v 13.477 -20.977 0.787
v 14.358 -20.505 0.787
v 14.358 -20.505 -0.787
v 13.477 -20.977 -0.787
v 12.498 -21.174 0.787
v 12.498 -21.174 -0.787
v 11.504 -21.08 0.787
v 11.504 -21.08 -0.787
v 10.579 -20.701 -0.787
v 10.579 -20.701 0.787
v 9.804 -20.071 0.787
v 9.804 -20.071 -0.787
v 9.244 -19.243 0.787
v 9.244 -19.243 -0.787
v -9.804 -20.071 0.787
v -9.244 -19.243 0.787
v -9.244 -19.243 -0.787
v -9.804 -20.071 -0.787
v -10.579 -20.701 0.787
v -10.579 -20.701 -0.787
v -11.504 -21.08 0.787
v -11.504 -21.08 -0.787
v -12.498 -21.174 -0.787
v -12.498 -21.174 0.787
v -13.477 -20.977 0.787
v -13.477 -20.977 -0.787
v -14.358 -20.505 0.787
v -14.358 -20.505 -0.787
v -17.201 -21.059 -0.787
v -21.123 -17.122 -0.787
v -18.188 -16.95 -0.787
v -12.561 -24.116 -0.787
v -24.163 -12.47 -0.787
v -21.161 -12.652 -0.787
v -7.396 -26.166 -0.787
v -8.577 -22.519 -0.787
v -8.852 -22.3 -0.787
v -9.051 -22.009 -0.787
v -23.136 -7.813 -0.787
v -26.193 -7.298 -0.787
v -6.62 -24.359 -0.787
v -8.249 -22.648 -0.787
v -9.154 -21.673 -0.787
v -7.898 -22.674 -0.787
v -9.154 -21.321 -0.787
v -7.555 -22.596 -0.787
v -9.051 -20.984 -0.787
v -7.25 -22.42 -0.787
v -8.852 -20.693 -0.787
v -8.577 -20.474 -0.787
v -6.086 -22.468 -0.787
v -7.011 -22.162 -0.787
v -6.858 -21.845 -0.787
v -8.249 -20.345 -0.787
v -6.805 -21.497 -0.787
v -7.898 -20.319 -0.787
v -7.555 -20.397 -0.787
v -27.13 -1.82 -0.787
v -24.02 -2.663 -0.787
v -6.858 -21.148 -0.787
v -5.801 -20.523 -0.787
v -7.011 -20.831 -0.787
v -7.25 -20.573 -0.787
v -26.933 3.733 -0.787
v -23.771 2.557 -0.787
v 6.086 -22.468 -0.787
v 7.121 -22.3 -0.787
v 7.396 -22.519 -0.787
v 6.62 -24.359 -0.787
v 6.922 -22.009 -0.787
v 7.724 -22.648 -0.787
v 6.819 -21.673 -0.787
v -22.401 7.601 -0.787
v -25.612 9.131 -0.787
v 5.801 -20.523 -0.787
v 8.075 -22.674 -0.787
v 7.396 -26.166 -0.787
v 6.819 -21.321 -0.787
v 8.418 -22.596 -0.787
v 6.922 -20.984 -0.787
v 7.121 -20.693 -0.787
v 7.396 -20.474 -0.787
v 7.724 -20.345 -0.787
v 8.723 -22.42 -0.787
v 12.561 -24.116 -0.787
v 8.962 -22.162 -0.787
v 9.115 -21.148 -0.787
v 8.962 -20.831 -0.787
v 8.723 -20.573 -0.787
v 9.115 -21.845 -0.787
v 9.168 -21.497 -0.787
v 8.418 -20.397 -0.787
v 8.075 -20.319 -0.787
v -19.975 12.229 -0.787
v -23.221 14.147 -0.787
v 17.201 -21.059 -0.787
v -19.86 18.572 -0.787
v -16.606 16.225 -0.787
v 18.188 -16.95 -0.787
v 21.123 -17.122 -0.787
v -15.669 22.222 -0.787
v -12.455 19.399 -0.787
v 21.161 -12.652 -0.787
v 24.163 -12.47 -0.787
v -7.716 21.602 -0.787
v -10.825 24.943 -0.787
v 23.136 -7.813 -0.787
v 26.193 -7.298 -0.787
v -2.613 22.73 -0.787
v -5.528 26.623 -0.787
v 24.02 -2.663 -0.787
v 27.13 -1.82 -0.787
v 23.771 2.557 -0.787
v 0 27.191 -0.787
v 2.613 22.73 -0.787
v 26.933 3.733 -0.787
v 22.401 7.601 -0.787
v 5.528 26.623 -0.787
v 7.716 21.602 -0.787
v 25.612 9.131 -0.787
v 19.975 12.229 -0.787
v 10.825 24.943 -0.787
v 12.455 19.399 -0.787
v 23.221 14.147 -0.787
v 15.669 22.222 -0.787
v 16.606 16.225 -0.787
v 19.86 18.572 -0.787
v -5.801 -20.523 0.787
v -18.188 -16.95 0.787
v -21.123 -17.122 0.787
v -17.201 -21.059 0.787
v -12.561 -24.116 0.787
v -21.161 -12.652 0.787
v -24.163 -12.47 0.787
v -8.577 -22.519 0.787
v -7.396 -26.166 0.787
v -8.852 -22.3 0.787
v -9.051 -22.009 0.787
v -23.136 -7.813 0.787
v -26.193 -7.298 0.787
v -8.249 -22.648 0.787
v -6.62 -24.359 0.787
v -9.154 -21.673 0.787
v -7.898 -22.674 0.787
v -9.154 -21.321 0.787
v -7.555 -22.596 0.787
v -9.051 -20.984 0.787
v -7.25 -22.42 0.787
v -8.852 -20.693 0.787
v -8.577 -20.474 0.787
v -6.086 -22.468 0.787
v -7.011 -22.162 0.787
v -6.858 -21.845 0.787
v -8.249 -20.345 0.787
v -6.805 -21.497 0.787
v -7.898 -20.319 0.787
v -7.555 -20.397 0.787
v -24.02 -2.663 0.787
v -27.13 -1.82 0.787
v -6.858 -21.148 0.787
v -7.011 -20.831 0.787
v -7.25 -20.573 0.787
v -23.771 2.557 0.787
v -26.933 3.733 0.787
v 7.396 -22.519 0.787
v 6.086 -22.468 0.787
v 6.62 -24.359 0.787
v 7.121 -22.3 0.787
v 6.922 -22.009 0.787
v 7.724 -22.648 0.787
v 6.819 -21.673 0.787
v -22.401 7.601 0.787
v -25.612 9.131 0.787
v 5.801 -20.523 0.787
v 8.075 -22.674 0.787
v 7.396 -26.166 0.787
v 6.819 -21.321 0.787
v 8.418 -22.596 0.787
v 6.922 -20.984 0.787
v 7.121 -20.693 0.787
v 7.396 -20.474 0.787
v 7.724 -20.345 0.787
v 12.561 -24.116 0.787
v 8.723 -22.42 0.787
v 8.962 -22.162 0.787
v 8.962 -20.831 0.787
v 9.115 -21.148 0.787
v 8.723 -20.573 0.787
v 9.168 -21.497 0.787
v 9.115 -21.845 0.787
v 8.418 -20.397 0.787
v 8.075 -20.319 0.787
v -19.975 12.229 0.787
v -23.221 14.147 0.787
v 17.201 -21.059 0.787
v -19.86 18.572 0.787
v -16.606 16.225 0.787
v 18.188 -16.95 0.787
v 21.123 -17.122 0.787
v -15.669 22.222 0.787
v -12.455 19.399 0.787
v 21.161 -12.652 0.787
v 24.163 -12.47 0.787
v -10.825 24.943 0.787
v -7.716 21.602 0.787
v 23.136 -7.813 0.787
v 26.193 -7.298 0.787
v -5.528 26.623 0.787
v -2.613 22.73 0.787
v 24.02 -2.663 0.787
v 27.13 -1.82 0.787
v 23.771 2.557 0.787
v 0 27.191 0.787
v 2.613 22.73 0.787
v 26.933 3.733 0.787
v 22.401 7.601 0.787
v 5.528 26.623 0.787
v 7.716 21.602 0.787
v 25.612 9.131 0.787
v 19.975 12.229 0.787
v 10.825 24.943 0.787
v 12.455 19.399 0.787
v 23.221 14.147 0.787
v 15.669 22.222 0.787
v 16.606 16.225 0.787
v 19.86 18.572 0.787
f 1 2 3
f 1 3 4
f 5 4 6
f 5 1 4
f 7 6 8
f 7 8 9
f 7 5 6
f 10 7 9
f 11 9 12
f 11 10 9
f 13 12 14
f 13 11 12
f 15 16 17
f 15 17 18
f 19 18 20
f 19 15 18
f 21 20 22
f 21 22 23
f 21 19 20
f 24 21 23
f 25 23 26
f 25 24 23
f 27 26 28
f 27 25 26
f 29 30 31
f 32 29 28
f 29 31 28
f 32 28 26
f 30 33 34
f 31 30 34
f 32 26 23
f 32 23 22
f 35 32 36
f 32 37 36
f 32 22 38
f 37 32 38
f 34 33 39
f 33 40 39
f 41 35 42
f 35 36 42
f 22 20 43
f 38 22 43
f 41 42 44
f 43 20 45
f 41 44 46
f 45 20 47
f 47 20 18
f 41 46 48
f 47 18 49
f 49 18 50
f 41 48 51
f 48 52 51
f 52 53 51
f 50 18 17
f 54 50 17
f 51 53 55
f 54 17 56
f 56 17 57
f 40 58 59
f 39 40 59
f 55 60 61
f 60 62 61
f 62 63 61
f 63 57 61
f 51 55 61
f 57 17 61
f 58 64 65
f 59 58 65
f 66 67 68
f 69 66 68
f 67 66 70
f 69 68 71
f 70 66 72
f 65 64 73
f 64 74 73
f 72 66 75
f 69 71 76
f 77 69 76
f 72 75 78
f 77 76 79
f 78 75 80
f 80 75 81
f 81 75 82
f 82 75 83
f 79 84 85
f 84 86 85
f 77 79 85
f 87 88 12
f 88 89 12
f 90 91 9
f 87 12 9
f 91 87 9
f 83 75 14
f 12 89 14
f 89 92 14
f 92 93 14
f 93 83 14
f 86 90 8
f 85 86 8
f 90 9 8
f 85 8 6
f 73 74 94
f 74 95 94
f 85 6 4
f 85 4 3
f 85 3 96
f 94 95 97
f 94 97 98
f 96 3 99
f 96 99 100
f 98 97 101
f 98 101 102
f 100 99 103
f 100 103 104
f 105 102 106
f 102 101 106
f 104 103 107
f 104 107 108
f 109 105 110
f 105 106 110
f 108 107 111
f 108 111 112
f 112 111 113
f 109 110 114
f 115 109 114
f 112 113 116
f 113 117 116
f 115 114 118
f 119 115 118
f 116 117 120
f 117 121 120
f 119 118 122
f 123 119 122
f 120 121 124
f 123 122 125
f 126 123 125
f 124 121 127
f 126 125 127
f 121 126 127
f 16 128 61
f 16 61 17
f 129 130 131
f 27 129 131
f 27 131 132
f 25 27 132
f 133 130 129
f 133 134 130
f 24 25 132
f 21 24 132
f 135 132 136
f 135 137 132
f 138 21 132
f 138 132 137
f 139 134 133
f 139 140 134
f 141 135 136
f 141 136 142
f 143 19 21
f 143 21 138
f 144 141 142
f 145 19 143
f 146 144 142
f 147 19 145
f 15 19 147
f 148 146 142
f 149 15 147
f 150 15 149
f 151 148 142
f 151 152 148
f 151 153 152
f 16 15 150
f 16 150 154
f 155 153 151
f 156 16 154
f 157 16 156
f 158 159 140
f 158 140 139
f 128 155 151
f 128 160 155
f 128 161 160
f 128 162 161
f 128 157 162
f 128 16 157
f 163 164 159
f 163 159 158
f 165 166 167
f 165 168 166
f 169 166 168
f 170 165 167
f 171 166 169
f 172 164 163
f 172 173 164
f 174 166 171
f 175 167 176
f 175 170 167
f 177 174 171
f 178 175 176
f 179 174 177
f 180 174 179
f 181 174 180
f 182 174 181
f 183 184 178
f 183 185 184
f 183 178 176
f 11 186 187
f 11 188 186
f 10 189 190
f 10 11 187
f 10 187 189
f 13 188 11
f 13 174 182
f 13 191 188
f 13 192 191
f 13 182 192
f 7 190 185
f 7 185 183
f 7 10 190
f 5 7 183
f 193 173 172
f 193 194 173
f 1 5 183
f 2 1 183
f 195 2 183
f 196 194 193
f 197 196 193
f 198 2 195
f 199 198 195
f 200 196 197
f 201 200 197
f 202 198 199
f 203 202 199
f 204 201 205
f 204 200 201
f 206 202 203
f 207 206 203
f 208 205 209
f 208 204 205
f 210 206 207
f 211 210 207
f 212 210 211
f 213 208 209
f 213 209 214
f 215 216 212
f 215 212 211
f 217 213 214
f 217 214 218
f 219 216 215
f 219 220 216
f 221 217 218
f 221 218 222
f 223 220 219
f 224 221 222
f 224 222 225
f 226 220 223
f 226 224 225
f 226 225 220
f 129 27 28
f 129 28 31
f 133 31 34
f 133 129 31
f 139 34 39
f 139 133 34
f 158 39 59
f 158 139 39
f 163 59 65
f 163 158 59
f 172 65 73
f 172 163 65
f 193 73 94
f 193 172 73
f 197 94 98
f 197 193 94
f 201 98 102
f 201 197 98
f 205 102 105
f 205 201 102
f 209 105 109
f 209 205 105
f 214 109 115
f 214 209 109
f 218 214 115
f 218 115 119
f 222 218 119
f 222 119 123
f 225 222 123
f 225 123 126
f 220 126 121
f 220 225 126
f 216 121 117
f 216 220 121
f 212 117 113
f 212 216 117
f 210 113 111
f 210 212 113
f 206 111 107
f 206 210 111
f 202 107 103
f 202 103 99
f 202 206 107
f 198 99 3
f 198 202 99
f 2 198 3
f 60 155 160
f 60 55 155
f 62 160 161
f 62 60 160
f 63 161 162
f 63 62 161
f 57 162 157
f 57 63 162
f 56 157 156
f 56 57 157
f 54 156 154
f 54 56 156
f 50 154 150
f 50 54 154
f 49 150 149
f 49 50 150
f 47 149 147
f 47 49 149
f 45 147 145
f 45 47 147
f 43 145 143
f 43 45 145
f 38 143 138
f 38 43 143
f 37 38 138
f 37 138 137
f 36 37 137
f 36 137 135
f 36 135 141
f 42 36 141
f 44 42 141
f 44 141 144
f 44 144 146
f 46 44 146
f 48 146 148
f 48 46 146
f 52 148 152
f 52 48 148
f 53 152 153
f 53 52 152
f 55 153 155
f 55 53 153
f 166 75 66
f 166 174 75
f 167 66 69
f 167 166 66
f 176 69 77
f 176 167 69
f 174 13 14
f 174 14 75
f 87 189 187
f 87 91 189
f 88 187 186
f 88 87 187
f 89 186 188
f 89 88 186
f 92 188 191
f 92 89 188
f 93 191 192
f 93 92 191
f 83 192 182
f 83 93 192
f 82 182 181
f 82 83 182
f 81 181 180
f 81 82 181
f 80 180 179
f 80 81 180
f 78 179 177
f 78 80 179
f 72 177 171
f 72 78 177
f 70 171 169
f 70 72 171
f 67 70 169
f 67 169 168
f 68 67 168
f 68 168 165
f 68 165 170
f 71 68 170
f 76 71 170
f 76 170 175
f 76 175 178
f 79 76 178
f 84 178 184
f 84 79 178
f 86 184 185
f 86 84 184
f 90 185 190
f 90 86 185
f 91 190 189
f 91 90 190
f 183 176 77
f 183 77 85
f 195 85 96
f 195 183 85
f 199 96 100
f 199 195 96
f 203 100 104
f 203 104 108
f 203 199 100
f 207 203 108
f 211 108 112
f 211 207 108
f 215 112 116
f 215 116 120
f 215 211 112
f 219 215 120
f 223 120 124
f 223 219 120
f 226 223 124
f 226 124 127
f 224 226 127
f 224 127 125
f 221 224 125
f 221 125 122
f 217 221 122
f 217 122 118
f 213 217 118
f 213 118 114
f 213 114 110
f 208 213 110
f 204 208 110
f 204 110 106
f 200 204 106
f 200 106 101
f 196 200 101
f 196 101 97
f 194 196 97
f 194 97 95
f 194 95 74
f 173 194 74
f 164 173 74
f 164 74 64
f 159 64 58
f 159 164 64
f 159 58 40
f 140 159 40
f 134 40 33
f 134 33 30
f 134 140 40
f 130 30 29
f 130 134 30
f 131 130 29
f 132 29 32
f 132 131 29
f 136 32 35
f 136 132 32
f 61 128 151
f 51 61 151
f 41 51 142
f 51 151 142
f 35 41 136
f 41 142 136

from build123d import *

# Parameters (mm, degrees)
SKETCH3_R                = 1.1811
BOSS_EXTRUDE1_DEPTH      = 0.7874
BOSS_EXTRUDE1_DEPTH_BACK = 0.7874
CUT_EXTRUDE1_DEPTH       = 1.7874


with BuildPart() as part:
    # Sketch3 → Boss-Extrude1 (new body, two sides)
    with BuildSketch(Plane.XY) as boss_extrude1_sk:
        with BuildLine():
            Line((-7.084786794, -26.251475436), (-5.5626, -20.611270532))
            Line((-5.5626, -20.611270532), (-9.244241607, -19.243466133))
            ThreePointArc((-9.244241607, -19.243466133), (-11.503586026, -21.079506525), (-14.357593282, -20.504768227))
            ThreePointArc((-14.357593282, -20.504768227), (0, 22.8727), (14.357593282, -20.504768227))
            ThreePointArc((14.357593282, -20.504768227), (11.503586026, -21.079506525), (9.244241607, -19.243466133))
            Line((9.244241607, -19.243466133), (5.5626, -20.611270532))
            Line((5.5626, -20.611270532), (7.084786794, -26.251475436))
            ThreePointArc((7.084786794, -26.251475436), (0, 27.1907), (-7.084786794, -26.251475436))
        make_face()
        with Locations((-7.986421892, -21.496599331)):
            Circle(SKETCH3_R, mode=Mode.SUBTRACT)
        with Locations((7.986421892, -21.496599331)):
            Circle(SKETCH3_R, mode=Mode.SUBTRACT)
    extrude(amount=BOSS_EXTRUDE1_DEPTH)
    extrude(boss_extrude1_sk.sketch, amount=-BOSS_EXTRUDE1_DEPTH_BACK)

    # Sketch4 → Cut-Extrude1 (cut, symmetric)
    with BuildSketch(Plane.XY):
        with BuildLine():
            Line((-7.395614895, -26.165608092), (-7.395614895, -33.561222987))
            Line((-7.395614895, -33.561222987), (0, -33.561222987))
            Line((0, -33.561222987), (0, -27.1907))
            Line((0, -27.1907), (0, -20.522811972))
            Line((0, -20.522811972), (-5.800698894, -20.522811972))
            ThreePointArc((-5.800698894, -20.522811972), (-6.322313955, -23.422176045), (-7.395614895, -26.165608092))
        make_face()
    cut_extrude1 = extrude(amount=CUT_EXTRUDE1_DEPTH, both=True, mode=Mode.SUBTRACT)

    # Mirror1: Cut-Extrude1 across plane
    add(cut_extrude1.mirror(Plane(origin=(0, 0, 0), x_dir=(0, 0, 1), z_dir=(1, 0, 0))), mode=Mode.SUBTRACT)


solid = part.part
